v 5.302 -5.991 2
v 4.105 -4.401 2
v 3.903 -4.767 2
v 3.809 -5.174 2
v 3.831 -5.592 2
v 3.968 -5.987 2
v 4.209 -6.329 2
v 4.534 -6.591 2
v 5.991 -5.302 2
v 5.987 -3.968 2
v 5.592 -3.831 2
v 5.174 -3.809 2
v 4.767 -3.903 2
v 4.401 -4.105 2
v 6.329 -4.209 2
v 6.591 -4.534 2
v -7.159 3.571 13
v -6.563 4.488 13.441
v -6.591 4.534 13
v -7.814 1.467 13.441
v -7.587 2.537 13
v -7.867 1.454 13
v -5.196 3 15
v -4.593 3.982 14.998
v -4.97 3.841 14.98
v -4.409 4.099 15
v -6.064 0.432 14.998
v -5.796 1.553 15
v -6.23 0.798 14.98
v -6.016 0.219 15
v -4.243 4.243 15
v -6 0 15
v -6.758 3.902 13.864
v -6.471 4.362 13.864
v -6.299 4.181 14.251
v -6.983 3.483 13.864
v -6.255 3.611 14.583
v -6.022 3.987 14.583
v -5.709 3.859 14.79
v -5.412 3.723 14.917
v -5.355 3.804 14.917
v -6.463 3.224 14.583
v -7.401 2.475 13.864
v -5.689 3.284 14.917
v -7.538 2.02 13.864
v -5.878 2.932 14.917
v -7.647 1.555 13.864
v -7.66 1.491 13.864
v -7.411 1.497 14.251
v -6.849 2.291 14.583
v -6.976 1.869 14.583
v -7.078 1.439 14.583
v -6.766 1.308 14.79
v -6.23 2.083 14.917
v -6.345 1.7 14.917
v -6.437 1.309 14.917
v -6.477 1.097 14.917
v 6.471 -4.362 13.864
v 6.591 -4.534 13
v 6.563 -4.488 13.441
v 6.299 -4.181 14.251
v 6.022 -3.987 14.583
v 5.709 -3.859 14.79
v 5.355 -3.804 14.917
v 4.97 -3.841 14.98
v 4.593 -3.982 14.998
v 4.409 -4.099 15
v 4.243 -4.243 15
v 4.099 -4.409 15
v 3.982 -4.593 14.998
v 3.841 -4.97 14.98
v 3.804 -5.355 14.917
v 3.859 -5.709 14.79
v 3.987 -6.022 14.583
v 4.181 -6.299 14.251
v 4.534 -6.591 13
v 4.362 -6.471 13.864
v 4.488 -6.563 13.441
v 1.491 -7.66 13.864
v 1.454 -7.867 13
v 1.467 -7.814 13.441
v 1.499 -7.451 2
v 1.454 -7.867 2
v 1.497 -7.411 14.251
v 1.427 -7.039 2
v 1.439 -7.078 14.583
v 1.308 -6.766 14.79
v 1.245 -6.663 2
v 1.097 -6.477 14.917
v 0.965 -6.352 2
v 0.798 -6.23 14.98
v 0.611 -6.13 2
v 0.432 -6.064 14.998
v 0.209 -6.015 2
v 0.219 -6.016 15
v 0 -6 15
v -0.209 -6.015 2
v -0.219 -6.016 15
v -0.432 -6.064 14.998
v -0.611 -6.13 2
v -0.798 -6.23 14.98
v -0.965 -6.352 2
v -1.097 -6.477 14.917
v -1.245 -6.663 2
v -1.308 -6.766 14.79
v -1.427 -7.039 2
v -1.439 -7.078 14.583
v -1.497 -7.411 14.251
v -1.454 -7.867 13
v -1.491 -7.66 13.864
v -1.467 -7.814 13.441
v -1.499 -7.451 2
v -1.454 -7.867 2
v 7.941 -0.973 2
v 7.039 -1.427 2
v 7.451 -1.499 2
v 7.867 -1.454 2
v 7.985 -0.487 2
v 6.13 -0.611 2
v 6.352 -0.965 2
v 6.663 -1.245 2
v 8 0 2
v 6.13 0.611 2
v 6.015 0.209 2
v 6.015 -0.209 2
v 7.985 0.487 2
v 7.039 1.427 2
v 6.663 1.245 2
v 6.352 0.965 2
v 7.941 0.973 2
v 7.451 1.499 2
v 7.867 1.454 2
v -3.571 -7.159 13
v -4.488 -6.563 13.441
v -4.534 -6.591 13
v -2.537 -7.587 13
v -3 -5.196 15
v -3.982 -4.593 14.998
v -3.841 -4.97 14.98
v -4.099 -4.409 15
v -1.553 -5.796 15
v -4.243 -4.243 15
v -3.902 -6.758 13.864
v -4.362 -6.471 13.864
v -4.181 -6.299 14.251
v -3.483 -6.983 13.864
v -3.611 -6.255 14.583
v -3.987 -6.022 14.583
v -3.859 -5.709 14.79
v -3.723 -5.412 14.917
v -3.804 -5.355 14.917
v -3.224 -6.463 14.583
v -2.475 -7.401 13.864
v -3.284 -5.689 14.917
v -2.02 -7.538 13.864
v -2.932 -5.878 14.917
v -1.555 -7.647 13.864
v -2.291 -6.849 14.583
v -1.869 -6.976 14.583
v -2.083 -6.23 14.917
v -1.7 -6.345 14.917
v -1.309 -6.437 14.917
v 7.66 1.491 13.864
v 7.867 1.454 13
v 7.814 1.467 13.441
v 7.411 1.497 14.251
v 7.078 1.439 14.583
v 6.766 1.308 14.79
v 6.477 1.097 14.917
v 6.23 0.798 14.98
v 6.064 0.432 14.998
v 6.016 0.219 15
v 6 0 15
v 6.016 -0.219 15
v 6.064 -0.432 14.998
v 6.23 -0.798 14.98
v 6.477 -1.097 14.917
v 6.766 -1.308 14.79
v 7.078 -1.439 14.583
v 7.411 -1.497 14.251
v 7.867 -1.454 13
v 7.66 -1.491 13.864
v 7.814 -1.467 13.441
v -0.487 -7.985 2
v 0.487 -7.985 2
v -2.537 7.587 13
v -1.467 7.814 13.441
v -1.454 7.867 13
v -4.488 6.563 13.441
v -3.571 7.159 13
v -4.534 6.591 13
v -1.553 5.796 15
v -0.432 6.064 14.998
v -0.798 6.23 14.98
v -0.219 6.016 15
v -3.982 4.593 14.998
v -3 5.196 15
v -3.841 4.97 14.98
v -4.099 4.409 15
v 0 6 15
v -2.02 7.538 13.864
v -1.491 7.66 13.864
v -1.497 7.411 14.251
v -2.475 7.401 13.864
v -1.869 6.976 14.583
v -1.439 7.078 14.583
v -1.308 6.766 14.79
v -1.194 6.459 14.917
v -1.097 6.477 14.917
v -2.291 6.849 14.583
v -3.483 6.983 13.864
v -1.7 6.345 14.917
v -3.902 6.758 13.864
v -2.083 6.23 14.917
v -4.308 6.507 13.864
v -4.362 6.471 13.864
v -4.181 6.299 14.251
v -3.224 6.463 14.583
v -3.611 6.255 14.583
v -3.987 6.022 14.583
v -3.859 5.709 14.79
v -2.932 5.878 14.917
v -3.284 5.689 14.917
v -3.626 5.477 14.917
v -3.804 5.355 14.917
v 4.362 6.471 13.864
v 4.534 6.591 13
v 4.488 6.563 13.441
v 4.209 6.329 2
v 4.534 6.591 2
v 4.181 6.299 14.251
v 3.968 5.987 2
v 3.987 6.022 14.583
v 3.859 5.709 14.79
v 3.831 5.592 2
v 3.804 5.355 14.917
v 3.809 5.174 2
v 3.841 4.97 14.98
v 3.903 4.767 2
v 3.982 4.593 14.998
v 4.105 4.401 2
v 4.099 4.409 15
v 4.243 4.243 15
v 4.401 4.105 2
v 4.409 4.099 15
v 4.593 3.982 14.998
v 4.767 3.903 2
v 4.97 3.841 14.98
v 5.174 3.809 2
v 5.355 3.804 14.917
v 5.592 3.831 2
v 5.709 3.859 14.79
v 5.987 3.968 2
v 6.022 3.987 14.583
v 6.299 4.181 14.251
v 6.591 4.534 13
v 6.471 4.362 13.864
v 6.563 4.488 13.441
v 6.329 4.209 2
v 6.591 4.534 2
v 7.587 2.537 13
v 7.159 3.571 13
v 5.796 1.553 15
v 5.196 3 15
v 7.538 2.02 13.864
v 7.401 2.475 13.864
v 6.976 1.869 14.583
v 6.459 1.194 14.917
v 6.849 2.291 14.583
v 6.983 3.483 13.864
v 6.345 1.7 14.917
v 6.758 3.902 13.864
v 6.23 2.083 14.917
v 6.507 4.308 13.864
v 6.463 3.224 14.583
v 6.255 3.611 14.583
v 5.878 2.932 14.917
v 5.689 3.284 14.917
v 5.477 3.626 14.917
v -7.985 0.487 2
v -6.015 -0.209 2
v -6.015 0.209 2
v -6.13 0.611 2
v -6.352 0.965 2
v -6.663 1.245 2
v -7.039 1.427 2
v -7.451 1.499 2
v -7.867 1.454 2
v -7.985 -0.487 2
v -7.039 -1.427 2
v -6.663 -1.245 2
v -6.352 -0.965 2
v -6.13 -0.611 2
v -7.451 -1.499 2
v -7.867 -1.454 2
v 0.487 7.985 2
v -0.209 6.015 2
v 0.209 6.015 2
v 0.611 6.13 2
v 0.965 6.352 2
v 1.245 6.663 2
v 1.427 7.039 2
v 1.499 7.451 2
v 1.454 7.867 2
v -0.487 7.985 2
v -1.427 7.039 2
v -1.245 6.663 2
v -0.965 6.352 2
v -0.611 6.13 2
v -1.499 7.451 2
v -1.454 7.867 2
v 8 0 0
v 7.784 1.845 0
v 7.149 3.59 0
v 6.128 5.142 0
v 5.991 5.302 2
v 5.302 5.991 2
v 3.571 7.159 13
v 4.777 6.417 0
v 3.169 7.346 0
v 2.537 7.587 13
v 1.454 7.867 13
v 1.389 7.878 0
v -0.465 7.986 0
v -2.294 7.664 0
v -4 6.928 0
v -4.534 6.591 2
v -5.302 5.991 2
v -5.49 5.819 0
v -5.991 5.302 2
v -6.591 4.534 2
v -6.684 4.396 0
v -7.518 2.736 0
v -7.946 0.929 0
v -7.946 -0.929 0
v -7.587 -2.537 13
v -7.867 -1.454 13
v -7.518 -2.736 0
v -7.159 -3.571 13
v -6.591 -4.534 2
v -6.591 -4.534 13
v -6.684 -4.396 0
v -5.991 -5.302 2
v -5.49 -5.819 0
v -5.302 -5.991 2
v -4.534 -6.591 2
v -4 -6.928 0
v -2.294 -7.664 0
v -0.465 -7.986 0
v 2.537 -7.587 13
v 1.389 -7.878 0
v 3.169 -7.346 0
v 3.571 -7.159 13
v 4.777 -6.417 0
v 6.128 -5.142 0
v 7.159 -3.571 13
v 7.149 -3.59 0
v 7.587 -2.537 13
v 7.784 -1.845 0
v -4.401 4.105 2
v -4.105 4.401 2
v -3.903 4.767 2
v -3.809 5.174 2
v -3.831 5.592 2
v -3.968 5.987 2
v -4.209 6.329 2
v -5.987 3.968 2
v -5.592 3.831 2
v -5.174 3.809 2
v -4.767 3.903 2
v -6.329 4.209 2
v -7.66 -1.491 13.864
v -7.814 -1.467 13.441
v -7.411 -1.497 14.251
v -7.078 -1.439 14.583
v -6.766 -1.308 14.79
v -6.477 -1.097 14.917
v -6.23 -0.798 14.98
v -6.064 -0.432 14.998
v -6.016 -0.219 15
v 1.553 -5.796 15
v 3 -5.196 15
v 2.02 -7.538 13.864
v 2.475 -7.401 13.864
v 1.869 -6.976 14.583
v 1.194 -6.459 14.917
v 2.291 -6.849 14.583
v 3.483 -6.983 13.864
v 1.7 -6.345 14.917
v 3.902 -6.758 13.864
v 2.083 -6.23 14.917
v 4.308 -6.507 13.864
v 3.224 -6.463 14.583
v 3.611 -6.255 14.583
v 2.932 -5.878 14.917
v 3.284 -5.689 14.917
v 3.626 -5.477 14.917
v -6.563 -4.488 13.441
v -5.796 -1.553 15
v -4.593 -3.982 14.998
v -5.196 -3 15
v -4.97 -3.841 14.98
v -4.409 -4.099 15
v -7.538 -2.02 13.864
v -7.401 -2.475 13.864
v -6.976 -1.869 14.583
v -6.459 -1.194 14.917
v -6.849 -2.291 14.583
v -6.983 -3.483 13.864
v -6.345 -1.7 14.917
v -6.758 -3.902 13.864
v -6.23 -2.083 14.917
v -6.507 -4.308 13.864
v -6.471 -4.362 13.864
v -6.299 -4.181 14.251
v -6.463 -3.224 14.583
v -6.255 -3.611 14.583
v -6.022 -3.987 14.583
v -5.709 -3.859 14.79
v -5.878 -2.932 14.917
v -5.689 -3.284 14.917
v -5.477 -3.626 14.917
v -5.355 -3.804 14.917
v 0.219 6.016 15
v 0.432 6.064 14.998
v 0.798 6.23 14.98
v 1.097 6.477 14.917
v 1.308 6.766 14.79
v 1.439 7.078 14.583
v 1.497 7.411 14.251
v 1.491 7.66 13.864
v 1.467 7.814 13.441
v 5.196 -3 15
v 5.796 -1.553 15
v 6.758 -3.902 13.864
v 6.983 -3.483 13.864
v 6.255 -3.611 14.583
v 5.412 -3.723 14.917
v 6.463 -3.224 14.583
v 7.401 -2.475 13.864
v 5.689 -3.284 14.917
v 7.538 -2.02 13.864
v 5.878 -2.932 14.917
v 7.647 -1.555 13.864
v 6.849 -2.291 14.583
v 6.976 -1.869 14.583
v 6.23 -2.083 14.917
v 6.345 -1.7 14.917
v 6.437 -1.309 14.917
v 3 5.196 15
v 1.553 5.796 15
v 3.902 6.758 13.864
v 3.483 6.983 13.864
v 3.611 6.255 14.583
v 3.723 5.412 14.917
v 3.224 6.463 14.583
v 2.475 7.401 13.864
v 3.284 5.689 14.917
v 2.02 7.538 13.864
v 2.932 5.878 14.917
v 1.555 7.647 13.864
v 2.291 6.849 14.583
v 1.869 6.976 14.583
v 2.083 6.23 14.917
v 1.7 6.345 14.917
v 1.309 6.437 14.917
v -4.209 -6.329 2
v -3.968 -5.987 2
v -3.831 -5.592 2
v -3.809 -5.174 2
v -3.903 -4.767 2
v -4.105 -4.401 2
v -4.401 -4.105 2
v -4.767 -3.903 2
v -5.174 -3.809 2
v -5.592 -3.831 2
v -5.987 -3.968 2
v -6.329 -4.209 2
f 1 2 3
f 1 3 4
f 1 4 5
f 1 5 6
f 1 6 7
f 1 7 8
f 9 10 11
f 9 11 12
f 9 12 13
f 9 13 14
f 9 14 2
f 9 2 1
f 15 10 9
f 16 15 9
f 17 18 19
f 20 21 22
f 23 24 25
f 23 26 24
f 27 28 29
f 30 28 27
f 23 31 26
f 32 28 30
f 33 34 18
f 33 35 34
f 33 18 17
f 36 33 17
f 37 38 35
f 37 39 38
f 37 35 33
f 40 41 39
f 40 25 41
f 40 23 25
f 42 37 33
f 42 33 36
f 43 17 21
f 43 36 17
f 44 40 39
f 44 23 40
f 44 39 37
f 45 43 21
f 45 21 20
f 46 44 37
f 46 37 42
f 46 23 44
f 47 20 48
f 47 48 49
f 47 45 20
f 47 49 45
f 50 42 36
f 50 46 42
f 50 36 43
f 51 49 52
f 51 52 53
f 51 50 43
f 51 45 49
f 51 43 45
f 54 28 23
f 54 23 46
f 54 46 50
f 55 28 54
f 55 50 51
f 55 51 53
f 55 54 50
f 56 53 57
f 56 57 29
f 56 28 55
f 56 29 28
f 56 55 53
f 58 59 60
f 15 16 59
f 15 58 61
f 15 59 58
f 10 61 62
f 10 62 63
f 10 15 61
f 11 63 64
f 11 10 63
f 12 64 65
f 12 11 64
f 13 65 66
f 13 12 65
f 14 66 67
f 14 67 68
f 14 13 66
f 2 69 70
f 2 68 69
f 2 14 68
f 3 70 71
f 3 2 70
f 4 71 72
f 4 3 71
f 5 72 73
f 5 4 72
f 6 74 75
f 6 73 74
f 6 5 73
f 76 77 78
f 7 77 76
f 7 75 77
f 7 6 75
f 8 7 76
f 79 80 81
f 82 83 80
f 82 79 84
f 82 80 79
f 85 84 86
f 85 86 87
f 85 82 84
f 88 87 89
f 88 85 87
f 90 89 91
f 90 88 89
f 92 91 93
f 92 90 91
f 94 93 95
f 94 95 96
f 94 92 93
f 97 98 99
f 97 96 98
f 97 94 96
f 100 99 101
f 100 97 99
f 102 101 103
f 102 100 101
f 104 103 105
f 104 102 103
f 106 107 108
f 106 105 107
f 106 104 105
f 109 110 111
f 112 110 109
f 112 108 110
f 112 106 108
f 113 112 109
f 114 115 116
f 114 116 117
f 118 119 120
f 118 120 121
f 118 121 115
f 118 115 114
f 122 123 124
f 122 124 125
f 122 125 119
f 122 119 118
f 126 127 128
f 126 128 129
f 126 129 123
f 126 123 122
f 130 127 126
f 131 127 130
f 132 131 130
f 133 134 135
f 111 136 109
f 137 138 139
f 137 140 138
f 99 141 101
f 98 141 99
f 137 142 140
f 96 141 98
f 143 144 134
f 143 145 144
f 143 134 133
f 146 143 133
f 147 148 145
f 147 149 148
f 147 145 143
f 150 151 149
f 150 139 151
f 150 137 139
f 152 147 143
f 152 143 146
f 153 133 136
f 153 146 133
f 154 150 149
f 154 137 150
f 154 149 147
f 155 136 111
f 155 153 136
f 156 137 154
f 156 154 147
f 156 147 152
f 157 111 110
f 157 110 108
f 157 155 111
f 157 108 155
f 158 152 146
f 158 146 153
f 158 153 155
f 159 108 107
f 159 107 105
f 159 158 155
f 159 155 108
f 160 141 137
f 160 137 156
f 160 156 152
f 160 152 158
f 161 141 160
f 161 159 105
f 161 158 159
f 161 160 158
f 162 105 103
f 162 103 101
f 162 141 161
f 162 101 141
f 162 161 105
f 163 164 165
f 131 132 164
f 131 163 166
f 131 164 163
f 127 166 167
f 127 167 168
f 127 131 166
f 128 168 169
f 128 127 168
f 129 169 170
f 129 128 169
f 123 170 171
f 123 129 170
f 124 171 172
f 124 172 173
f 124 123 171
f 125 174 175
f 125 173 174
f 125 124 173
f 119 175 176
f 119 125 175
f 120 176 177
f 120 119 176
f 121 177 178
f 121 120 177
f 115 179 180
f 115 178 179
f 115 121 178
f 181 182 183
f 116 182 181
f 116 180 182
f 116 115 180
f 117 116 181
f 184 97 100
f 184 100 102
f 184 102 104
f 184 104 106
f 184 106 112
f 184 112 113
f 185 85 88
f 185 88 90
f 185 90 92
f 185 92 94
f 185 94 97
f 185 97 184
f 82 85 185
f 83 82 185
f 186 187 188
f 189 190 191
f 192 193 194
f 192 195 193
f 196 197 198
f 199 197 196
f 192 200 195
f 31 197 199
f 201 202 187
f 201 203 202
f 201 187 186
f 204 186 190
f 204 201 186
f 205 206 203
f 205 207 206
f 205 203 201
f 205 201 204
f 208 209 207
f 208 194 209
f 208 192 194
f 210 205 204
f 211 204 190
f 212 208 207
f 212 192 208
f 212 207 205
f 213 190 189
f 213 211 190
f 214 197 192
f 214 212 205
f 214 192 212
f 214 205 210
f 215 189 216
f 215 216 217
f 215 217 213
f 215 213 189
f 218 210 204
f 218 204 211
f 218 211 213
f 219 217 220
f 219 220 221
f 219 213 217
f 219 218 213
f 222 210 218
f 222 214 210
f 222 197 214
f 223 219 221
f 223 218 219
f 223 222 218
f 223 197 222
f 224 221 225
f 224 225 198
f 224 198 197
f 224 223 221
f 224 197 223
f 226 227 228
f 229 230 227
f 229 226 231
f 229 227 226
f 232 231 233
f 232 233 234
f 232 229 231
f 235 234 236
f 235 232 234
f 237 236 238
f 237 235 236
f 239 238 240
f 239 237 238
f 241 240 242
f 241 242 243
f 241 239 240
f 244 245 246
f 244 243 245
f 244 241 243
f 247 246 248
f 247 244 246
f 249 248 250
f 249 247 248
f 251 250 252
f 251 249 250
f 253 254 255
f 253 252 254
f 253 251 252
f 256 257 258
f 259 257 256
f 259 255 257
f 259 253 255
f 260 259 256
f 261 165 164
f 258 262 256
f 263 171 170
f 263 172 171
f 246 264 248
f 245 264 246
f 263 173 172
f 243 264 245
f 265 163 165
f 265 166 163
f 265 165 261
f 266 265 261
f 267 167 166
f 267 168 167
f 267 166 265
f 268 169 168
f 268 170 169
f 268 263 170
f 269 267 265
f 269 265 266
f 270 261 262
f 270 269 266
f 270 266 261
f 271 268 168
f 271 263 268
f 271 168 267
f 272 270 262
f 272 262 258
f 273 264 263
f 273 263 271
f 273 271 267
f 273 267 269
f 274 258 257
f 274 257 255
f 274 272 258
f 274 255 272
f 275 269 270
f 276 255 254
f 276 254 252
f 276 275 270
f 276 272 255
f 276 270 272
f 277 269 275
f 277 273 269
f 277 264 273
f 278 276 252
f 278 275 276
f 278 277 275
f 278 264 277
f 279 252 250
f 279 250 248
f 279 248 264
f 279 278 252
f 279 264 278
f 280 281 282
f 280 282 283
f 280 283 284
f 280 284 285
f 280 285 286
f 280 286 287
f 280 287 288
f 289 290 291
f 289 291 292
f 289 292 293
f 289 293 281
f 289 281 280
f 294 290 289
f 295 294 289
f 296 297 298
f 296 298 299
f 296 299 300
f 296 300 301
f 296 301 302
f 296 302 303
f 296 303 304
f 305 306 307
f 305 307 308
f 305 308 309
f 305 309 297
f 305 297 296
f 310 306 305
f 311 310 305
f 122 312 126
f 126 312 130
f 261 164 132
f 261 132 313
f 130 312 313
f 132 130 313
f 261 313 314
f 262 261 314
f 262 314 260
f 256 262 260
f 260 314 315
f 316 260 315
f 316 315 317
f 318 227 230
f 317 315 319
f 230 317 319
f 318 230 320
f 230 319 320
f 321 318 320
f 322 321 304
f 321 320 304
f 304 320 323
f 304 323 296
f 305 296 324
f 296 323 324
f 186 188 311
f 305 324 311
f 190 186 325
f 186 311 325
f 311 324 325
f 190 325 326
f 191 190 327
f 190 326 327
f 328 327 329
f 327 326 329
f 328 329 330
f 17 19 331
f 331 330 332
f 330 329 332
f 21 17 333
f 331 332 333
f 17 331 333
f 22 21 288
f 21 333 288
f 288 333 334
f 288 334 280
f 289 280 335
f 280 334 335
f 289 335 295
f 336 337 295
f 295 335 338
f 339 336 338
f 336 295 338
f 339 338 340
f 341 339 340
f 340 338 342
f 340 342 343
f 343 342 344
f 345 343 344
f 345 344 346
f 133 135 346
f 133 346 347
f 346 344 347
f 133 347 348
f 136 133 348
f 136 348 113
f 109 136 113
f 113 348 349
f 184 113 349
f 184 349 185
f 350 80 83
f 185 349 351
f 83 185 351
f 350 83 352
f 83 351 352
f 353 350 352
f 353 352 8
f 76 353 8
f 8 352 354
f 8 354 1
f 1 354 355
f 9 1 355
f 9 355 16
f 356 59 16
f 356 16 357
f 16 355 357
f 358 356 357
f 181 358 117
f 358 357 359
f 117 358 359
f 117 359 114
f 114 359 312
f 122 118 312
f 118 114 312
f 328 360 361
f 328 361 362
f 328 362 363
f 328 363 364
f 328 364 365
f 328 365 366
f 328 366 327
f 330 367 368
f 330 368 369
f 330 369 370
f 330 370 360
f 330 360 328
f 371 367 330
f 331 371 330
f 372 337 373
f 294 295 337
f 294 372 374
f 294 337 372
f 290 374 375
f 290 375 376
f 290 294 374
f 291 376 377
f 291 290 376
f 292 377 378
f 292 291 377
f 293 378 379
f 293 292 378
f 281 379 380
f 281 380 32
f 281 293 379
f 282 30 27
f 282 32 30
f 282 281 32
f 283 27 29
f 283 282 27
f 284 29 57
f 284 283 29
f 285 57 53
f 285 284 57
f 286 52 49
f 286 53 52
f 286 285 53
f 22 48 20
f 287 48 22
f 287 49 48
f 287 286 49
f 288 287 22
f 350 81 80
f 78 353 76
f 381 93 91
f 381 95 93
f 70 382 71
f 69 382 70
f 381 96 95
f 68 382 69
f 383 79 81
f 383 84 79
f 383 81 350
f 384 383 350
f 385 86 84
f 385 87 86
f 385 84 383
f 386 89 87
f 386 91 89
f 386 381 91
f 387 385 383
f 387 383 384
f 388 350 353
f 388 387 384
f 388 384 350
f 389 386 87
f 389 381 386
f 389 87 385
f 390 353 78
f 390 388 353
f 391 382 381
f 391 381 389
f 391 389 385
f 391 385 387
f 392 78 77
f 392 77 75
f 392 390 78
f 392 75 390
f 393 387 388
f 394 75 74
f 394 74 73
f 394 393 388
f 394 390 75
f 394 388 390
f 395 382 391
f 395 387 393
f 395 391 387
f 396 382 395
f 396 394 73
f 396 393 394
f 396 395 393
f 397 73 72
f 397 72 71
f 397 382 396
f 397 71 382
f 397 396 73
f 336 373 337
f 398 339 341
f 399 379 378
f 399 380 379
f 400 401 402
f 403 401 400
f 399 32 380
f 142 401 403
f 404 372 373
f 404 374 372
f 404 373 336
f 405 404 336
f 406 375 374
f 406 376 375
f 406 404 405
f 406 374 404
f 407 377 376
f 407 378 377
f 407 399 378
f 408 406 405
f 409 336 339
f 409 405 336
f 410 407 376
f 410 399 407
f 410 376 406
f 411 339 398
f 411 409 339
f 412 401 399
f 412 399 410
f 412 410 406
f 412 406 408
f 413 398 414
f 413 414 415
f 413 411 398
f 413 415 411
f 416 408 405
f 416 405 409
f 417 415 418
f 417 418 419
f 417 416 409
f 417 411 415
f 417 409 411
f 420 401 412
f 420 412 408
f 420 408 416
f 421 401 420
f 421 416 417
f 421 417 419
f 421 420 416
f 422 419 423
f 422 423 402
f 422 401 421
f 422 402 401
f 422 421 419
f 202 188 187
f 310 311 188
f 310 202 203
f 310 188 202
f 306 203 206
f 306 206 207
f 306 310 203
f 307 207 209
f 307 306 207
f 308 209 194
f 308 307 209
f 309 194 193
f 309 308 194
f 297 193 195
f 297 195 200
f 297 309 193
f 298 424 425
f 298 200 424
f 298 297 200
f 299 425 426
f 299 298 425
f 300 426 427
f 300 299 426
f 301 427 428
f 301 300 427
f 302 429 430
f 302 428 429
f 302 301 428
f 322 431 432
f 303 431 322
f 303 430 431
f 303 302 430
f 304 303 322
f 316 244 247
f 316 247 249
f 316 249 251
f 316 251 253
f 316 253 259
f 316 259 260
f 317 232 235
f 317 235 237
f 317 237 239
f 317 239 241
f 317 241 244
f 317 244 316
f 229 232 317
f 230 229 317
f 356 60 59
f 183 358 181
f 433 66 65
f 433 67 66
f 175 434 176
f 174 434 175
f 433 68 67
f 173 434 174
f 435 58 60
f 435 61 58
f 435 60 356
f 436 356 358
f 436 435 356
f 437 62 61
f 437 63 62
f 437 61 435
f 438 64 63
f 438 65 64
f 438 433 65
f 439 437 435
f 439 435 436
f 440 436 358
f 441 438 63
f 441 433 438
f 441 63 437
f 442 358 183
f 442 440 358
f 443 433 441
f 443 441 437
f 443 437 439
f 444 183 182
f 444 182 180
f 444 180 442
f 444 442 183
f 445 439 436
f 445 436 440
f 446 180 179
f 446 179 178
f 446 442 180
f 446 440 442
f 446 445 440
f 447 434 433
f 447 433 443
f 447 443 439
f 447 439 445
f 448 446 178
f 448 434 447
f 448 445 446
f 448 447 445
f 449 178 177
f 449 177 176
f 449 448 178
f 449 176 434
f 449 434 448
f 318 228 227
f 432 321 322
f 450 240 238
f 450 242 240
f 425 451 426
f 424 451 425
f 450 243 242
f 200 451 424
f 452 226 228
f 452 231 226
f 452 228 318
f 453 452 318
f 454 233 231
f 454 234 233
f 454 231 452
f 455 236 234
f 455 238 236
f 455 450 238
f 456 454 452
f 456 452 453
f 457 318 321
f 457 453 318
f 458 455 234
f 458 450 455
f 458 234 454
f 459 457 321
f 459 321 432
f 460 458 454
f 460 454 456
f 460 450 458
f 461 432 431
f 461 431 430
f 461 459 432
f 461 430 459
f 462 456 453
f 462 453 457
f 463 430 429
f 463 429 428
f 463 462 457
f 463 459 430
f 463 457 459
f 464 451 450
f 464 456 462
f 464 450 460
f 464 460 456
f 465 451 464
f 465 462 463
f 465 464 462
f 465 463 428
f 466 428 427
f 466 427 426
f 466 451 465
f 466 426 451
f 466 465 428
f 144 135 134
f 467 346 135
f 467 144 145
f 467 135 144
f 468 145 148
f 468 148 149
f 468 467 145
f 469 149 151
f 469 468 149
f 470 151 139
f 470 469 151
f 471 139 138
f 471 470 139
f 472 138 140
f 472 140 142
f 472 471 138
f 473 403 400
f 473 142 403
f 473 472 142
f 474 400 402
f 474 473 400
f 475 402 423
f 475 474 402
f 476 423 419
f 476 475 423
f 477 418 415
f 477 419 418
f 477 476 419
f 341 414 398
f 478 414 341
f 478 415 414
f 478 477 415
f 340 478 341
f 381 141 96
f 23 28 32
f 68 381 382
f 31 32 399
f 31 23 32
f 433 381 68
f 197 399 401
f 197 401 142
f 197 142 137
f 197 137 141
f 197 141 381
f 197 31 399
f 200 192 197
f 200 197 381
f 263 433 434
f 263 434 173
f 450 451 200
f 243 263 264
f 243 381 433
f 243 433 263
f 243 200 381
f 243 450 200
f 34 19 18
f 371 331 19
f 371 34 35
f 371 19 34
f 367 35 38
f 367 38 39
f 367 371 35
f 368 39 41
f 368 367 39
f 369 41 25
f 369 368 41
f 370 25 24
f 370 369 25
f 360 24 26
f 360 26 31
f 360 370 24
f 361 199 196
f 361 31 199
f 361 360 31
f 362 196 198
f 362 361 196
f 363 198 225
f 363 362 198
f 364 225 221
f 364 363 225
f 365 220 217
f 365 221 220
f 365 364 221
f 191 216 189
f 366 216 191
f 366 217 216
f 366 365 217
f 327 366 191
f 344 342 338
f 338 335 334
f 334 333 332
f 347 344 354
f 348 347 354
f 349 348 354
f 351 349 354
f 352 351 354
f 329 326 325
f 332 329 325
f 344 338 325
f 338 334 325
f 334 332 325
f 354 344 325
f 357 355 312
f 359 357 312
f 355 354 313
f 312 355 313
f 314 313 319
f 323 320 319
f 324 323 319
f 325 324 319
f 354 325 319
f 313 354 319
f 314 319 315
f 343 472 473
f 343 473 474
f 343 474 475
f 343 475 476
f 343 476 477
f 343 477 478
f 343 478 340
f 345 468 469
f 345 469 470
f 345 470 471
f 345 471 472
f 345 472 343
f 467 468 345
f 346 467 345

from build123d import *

# Parameters (mm, degrees)
CYLINDER001_R     = 1.5
CYLINDER001_DEPTH = 30
ARRAY_COUNT       = 8
CYLINDER_R        = 8
CYLINDER_DEPTH    = 15
FILLET_R          = 2


with BuildPart() as array:
    # Cylinder001 → Cylinder001 (new body)
    with BuildSketch(Plane(origin=(7.5, 0, 0), x_dir=(1, 0, 0), z_dir=(0, 0, 1))):
        Circle(CYLINDER001_R)
    extrude(amount=CYLINDER001_DEPTH)

    # Array: Array ×8 about axis
    array_axis = Axis((0, 0, 0), (0, 0, 1))


with BuildPart() as array_1:
    add(array.part)
    for i in range(1, ARRAY_COUNT):
        add(array.part.rotate(array_axis, i * 360 / ARRAY_COUNT))


with BuildPart() as array_2:
    # Array placement: moved
    add(array_1.part.moved(Location((0, 0, 2))))


with BuildPart() as cut:
    # Cylinder → Cylinder (new body)
    with BuildSketch(Plane.XY):
        Circle(CYLINDER_R)
    extrude(amount=CYLINDER_DEPTH)

    # Fillet
    fillet_edges = [cut.edges().sort_by_distance(p)[0] for p in [
        (-8, 0, 15),
    ]]
    fillet(fillet_edges, radius=FILLET_R)

    # Cut: cut Array
    add(array_2.part, mode=Mode.SUBTRACT)


solid = cut.part
